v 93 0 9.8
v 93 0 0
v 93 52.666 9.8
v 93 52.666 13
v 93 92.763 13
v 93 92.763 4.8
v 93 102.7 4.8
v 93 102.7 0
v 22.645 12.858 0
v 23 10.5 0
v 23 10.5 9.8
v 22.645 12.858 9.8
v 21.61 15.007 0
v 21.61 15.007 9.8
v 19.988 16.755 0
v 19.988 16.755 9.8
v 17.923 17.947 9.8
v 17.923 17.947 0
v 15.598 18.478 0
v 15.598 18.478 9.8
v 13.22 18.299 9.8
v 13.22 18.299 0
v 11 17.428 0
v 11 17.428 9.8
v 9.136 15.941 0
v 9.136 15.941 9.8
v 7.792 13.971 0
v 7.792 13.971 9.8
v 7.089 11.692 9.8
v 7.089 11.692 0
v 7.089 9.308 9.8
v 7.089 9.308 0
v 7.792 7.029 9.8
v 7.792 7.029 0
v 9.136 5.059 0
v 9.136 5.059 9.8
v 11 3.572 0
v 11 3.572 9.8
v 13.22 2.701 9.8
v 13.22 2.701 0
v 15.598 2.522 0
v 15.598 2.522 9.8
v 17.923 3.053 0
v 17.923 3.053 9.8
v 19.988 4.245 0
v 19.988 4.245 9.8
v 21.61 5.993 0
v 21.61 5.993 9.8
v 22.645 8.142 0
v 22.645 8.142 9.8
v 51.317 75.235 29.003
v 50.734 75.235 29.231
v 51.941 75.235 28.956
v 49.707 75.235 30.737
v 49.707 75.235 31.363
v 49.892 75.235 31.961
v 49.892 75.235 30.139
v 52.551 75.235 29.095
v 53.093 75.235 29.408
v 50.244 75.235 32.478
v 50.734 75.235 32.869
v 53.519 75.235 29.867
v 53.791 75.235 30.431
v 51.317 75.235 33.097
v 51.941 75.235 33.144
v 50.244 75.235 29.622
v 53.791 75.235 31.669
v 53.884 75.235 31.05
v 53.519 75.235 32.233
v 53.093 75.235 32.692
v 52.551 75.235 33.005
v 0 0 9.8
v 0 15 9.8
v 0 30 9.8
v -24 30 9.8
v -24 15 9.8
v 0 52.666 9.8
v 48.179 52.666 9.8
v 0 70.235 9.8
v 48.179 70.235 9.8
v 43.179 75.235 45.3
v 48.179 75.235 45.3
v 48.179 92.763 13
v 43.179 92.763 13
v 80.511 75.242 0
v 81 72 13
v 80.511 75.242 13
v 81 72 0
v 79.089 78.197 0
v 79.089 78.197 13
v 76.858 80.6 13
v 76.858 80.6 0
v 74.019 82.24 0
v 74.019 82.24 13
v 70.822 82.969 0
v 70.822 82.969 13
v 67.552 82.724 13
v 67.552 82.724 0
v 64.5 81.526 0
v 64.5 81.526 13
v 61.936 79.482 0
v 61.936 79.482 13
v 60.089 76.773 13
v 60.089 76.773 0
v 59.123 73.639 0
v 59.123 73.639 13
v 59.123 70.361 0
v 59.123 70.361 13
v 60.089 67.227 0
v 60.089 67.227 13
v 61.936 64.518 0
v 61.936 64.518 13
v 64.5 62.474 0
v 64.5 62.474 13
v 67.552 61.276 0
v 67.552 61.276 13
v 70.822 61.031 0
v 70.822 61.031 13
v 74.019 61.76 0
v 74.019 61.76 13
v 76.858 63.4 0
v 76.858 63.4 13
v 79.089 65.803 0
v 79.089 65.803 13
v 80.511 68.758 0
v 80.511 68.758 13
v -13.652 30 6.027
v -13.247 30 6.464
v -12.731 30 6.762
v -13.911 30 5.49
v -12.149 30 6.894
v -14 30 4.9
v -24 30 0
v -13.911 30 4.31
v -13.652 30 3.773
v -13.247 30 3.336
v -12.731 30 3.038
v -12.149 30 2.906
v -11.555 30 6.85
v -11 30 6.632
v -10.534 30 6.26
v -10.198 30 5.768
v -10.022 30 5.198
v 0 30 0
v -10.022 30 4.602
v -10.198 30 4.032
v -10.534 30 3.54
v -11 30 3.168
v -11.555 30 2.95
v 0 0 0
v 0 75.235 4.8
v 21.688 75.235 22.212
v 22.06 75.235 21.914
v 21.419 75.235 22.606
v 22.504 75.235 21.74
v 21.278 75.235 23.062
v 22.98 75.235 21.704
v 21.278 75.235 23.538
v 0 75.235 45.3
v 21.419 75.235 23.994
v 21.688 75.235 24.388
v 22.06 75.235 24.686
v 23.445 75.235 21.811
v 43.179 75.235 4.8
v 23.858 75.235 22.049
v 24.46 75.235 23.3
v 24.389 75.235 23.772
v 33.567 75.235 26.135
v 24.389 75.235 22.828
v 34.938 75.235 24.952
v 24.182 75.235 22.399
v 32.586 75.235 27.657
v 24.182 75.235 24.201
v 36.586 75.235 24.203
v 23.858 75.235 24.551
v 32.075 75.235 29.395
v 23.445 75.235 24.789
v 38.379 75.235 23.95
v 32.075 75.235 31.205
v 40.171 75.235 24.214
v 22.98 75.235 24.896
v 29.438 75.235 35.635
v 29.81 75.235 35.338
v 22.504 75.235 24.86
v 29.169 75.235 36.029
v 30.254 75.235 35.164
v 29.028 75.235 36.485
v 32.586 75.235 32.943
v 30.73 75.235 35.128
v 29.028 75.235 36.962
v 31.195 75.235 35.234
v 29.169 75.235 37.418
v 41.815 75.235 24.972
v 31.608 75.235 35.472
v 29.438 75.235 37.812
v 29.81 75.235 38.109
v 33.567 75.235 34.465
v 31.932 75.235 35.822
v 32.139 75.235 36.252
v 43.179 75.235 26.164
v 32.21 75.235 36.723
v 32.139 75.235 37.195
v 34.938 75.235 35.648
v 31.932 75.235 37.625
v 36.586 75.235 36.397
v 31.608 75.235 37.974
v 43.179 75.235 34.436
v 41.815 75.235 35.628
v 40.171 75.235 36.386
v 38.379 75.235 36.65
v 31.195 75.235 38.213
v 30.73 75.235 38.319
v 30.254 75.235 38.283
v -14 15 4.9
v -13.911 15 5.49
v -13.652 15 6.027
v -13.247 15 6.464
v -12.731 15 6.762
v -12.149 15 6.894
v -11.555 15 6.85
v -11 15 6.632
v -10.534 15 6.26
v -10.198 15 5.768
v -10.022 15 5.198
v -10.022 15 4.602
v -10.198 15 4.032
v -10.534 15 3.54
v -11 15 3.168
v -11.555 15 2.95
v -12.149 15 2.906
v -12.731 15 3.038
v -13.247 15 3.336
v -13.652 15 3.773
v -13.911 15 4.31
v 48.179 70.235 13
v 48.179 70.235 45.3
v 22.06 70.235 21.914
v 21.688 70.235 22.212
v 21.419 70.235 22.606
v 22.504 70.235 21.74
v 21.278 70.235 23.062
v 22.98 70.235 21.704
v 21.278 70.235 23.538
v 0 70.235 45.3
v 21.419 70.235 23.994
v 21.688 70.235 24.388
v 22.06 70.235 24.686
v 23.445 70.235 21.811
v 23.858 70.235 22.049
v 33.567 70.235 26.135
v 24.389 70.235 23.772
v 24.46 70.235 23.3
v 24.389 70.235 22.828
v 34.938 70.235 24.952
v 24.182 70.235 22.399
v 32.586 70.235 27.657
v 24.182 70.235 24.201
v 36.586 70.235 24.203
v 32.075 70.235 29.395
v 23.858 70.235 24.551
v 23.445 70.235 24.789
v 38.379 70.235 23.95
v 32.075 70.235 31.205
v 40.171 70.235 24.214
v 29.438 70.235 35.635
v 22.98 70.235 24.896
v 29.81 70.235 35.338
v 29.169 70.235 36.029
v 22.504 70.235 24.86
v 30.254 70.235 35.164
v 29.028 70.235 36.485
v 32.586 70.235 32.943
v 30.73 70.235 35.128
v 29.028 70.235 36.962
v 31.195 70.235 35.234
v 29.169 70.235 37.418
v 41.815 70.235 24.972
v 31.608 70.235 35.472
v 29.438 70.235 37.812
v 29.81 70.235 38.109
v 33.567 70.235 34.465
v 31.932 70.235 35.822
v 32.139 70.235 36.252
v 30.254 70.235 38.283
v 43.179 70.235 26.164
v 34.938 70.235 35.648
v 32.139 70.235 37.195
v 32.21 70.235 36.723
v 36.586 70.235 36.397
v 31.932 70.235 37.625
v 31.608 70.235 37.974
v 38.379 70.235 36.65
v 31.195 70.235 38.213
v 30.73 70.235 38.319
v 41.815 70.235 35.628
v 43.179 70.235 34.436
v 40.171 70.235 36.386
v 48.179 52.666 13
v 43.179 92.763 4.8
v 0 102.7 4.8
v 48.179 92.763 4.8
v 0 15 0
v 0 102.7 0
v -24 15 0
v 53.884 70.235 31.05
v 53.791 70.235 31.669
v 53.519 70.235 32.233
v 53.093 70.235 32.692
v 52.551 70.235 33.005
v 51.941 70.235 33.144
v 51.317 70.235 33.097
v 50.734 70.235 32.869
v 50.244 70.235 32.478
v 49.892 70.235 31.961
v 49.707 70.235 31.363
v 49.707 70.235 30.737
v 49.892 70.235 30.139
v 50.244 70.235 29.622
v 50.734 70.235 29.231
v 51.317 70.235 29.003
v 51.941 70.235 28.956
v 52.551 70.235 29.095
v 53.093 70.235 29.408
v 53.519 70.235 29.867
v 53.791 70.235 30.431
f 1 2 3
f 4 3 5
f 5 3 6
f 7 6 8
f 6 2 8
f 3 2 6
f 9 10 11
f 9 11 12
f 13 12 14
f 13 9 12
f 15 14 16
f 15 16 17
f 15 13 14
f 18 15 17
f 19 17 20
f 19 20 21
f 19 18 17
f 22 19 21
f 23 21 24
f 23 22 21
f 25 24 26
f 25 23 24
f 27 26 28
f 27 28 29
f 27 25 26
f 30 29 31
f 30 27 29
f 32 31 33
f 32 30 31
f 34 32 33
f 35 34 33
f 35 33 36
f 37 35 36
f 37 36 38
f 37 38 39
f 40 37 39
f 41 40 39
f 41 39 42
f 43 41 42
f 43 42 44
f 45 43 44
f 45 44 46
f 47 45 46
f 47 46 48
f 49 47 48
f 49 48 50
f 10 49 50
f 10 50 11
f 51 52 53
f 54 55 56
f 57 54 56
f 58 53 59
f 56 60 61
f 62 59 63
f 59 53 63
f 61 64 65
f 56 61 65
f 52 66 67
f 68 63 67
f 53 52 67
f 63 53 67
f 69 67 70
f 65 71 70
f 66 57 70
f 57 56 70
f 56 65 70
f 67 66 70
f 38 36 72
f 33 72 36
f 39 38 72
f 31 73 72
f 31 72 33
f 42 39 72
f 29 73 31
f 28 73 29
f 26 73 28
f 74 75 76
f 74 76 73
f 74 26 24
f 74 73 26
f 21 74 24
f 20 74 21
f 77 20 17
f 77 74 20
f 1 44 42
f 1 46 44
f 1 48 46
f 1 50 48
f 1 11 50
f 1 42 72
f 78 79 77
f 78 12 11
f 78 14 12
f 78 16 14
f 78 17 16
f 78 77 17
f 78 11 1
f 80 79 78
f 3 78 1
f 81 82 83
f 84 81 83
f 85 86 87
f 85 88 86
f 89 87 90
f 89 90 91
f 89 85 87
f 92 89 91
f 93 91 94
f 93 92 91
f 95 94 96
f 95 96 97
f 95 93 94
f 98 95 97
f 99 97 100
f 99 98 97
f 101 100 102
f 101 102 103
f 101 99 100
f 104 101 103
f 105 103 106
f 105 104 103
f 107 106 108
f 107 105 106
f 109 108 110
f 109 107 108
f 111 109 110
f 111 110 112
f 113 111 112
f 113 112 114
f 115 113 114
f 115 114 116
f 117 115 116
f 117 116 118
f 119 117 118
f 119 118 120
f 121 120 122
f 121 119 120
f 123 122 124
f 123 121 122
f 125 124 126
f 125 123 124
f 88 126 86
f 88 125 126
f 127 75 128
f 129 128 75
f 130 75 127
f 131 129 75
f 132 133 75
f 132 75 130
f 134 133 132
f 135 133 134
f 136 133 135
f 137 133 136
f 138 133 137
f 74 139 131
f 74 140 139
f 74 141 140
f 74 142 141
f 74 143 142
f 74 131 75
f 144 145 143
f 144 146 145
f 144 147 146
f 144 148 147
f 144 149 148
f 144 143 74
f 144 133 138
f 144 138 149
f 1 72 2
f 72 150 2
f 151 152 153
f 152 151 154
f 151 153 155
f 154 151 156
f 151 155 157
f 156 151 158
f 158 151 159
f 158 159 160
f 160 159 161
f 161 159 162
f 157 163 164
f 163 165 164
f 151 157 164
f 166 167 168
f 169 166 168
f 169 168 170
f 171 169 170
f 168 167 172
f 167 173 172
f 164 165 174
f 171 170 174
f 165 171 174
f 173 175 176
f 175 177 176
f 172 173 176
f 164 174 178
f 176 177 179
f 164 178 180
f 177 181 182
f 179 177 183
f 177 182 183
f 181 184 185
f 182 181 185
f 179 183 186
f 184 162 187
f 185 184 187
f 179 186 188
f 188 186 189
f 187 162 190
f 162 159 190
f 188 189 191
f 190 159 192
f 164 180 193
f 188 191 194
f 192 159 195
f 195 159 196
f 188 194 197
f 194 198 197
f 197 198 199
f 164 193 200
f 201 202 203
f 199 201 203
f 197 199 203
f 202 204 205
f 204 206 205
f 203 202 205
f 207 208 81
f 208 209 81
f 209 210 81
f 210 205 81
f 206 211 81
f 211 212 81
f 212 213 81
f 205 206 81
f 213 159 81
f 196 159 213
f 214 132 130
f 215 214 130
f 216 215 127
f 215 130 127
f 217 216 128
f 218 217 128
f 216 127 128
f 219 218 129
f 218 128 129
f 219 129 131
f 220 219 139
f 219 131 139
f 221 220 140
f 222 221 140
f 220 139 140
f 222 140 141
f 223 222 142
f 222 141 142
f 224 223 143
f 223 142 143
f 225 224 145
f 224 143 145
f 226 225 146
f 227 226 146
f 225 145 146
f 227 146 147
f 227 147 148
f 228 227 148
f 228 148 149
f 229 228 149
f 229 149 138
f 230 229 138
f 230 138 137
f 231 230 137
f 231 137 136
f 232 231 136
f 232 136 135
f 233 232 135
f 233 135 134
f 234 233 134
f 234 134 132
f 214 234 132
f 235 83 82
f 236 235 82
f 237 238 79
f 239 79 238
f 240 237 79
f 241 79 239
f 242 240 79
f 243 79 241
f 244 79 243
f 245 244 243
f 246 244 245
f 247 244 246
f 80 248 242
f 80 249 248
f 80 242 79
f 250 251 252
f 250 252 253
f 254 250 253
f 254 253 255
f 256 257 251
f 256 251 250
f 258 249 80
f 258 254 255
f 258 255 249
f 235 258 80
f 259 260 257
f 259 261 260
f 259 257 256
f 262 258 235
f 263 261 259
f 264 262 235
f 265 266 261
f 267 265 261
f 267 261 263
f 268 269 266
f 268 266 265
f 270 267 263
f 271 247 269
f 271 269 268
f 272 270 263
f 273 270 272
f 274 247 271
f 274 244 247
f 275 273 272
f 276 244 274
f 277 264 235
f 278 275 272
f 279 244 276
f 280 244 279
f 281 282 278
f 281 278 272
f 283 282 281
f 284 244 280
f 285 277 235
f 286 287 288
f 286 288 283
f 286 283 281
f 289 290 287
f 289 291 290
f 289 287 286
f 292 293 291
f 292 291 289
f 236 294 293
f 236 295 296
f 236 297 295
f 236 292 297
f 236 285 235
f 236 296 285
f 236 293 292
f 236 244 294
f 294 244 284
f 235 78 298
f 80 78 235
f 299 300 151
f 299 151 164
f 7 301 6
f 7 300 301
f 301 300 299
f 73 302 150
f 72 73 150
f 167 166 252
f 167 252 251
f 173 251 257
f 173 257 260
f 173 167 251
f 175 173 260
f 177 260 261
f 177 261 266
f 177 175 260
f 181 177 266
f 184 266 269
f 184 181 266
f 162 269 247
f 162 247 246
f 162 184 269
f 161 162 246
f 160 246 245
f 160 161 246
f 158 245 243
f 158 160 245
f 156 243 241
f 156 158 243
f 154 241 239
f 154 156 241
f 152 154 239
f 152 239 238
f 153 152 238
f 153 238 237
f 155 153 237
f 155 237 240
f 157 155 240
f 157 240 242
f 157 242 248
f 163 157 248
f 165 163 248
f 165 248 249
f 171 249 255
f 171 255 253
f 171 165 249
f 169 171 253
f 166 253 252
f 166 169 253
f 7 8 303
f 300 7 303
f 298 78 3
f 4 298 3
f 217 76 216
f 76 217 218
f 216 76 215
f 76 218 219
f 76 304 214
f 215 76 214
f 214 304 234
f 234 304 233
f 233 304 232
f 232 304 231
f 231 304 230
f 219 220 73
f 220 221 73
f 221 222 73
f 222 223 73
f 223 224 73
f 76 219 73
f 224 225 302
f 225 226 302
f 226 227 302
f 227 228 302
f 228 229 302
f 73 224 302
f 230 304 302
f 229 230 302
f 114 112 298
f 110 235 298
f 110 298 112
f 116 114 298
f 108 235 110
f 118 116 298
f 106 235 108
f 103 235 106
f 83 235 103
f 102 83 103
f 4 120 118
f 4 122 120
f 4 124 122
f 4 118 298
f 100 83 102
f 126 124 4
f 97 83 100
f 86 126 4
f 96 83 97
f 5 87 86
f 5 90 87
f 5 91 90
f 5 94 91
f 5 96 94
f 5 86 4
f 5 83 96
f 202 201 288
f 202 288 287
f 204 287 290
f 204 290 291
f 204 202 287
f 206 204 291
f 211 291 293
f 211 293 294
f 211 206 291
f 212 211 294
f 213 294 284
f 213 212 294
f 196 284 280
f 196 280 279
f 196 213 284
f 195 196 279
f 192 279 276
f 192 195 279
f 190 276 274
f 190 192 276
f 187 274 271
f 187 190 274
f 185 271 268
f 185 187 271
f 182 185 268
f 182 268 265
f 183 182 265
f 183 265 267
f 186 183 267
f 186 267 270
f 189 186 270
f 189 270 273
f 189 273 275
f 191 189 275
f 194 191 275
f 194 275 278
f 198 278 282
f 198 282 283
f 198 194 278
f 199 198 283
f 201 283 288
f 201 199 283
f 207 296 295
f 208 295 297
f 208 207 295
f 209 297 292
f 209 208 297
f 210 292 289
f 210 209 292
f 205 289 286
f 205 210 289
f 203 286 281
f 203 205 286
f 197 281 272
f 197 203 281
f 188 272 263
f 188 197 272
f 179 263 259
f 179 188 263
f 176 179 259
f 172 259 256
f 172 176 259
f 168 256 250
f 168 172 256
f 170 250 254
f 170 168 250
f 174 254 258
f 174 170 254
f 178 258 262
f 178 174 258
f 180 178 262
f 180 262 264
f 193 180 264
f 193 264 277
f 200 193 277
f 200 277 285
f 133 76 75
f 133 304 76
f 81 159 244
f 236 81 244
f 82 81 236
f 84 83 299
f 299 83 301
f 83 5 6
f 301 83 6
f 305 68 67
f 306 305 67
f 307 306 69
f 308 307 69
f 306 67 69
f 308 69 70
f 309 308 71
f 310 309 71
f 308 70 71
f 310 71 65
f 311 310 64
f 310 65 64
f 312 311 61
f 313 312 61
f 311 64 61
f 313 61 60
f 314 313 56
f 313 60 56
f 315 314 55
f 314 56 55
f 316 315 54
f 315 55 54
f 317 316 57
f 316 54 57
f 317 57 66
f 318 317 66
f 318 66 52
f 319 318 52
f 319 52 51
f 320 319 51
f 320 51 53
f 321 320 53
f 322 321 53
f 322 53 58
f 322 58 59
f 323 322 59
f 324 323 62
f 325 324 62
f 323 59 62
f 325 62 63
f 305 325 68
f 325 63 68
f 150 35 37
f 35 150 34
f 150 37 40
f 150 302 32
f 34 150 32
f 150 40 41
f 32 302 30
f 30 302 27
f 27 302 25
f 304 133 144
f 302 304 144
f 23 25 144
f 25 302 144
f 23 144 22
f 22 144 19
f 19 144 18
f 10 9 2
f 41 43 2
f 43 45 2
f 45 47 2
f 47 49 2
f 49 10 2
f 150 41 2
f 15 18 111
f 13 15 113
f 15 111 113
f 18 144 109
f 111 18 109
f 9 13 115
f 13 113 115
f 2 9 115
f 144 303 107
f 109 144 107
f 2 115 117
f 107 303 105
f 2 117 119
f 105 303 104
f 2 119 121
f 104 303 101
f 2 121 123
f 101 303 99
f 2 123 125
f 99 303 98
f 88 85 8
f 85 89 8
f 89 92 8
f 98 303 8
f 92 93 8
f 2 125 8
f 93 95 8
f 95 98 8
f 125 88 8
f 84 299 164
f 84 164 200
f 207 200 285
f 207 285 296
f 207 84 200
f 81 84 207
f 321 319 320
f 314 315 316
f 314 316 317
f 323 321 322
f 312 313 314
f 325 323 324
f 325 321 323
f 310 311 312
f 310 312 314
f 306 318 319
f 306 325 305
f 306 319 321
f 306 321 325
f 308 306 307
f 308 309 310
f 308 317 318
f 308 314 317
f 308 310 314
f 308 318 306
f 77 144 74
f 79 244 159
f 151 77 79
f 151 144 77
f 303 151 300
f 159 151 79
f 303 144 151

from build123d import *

# Parameters (mm, degrees)
SKETCH1_R                 = 11
SKETCH1_R_2               = 8
BOSS_EXTRUDE1_DEPTH       = 4.8
SKETCH2_W                 = 44.821432693
SKETCH2_H                 = 40.097165435
SKETCH2_R                 = 11
BOSS_EXTRUDE2_DEPTH       = 8.2
SKETCH3_W                 = 24
SKETCH3_H                 = 15
SKETCH3_R                 = 8
BOSS_EXTRUDE3_DEPTH       = 5
BOSS_EXTRUDE4_OUTLINE_R   = 2.1
BOSS_EXTRUDE4_OUTLINE_W   = 48.178567307
BOSS_EXTRUDE4_OUTLINE_H   = 40.5
BOSS_EXTRUDE4_OUTLINE_R_2 = 1.6
BOSS_EXTRUDE4_OUTLINE_R_3 = 6.35
BOSS_EXTRUDE4_DEPTH       = 5
BOSS_EXTRUDE5_DEPTH       = 5
SKETCH6_W                 = 48.178567307
SKETCH6_H                 = 17.568704936
BOSS_EXTRUDE6_DEPTH       = 5
SKETCH8_R                 = 2
CUT_EXTRUDE1_DEPTH        = 127.437257167


# Read off the part's stored shape, not the designer's step: Boss-Extrude4
with BuildPart() as part:
    # Sketch1 → Boss-Extrude1 (new body)
    # profile 1 of 2: a face of its own
    with BuildSketch(Plane.XY):
        Polygon((0, 0), (93, 0), (93, 102.7), (0, 102.7), (0, 30), (-24, 30), (-24, 15), (0, 15), align=None)
        with Locations((15, 10.5)):
            Circle(SKETCH1_R, mode=Mode.SUBTRACT)
        with Locations((70, 72)):
            Circle(SKETCH1_R, mode=Mode.SUBTRACT)
    # profile 2 of 2: a face of its own
    with BuildSketch(Plane.XY):
        with BuildLine():
            ThreePointArc((26, 10.5), (8.48332569, 19.36188219), (11.721280738, 0))
            Line((11.721280738, 0), (18.278719262, 0))
            ThreePointArc((18.278719262, 0), (23.86188219, 3.98332569), (26, 10.5))
        make_face()
        with Locations((15, 10.5)):
            Circle(SKETCH1_R_2, mode=Mode.SUBTRACT)
    extrude(amount=BOSS_EXTRUDE1_DEPTH)

    # Sketch2 → Boss-Extrude2 (add)
    with BuildSketch(Plane.XY.offset(4.8)):
        with Locations((70.589283654, 72.714594712)):
            Rectangle(SKETCH2_W, SKETCH2_H)
        with Locations((70, 72)):
            Circle(SKETCH2_R, mode=Mode.SUBTRACT)
    extrude(amount=BOSS_EXTRUDE2_DEPTH)

    # Sketch3 → Boss-Extrude3 (add)
    # profile 1 of 2: a face of its own
    with BuildSketch(Plane.XY.offset(4.8)):
        with Locations((-12, 22.5)):
            Rectangle(SKETCH3_W, SKETCH3_H)
    # profile 2 of 2: a face of its own
    with BuildSketch(Plane.XY.offset(4.8)):
        Polygon((0, 30), (0, 15), (0, 0), (93, 0), (93, 52.666011994), (48.178567307, 52.666011994), (0, 52.666011994), align=None)
        with Locations((15, 10.5)):
            Circle(SKETCH3_R, mode=Mode.SUBTRACT)
    extrude(amount=BOSS_EXTRUDE3_DEPTH)

    # Boss-Extrude4 outline → Boss-Extrude4 (add)
    # profile 1 of 2: a face of its own
    with BuildSketch(Plane.XZ.offset(-75.23471693)):
        with Locations((51.783815806, 31.05)):
            Circle(BOSS_EXTRUDE4_OUTLINE_R)
    # profile 2 of 2: a face of its own
    with BuildSketch(Plane.XZ.offset(-75.23471693)):
        with Locations((24.089283654, 25.05)):
            Rectangle(BOSS_EXTRUDE4_OUTLINE_W, BOSS_EXTRUDE4_OUTLINE_H)
        with Locations((22.860422048, 23.3)):
            Circle(BOSS_EXTRUDE4_OUTLINE_R_2, mode=Mode.SUBTRACT)
        with Locations((38.360422048, 30.3)):
            Circle(BOSS_EXTRUDE4_OUTLINE_R_3, mode=Mode.SUBTRACT)
        with Locations((30.610422048, 36.723393759)):
            Circle(BOSS_EXTRUDE4_OUTLINE_R_2, mode=Mode.SUBTRACT)
        with Locations((46.110422048, 36.723393759)):
            Circle(BOSS_EXTRUDE4_OUTLINE_R_2, mode=Mode.SUBTRACT)
    extrude(amount=BOSS_EXTRUDE4_DEPTH)

    # Sketch5 → Boss-Extrude5 (add)
    with BuildSketch(Plane(origin=(48.178567307, 0, 0), x_dir=(0, 0, -1), z_dir=(1, 0, 0))):
        Polygon((-45.3, 75.23471693), (-13, 92.763177429), (-4.8, 92.763177429), (-4.8, 70.23471693), (-45.3, 70.23471693), align=None)
    extrude(amount=-BOSS_EXTRUDE5_DEPTH)

    # Sketch6 → Boss-Extrude6 (add)
    with BuildSketch(Plane.XY.offset(4.8)):
        with Locations((24.089283654, 61.450364462)):
            Rectangle(SKETCH6_W, SKETCH6_H)
    extrude(amount=BOSS_EXTRUDE6_DEPTH)

    # Sketch8 → Cut-Extrude1 (cut, through all)
    with BuildSketch(Plane(origin=(0, 30, 0), x_dir=(1, 0, 0), z_dir=(0, 1, 0))):
        with Locations(Location((-12, -4.9, 0), (0, 0, 180))):
            Circle(SKETCH8_R)
    extrude(amount=-CUT_EXTRUDE1_DEPTH, mode=Mode.SUBTRACT)


solid = part.part
